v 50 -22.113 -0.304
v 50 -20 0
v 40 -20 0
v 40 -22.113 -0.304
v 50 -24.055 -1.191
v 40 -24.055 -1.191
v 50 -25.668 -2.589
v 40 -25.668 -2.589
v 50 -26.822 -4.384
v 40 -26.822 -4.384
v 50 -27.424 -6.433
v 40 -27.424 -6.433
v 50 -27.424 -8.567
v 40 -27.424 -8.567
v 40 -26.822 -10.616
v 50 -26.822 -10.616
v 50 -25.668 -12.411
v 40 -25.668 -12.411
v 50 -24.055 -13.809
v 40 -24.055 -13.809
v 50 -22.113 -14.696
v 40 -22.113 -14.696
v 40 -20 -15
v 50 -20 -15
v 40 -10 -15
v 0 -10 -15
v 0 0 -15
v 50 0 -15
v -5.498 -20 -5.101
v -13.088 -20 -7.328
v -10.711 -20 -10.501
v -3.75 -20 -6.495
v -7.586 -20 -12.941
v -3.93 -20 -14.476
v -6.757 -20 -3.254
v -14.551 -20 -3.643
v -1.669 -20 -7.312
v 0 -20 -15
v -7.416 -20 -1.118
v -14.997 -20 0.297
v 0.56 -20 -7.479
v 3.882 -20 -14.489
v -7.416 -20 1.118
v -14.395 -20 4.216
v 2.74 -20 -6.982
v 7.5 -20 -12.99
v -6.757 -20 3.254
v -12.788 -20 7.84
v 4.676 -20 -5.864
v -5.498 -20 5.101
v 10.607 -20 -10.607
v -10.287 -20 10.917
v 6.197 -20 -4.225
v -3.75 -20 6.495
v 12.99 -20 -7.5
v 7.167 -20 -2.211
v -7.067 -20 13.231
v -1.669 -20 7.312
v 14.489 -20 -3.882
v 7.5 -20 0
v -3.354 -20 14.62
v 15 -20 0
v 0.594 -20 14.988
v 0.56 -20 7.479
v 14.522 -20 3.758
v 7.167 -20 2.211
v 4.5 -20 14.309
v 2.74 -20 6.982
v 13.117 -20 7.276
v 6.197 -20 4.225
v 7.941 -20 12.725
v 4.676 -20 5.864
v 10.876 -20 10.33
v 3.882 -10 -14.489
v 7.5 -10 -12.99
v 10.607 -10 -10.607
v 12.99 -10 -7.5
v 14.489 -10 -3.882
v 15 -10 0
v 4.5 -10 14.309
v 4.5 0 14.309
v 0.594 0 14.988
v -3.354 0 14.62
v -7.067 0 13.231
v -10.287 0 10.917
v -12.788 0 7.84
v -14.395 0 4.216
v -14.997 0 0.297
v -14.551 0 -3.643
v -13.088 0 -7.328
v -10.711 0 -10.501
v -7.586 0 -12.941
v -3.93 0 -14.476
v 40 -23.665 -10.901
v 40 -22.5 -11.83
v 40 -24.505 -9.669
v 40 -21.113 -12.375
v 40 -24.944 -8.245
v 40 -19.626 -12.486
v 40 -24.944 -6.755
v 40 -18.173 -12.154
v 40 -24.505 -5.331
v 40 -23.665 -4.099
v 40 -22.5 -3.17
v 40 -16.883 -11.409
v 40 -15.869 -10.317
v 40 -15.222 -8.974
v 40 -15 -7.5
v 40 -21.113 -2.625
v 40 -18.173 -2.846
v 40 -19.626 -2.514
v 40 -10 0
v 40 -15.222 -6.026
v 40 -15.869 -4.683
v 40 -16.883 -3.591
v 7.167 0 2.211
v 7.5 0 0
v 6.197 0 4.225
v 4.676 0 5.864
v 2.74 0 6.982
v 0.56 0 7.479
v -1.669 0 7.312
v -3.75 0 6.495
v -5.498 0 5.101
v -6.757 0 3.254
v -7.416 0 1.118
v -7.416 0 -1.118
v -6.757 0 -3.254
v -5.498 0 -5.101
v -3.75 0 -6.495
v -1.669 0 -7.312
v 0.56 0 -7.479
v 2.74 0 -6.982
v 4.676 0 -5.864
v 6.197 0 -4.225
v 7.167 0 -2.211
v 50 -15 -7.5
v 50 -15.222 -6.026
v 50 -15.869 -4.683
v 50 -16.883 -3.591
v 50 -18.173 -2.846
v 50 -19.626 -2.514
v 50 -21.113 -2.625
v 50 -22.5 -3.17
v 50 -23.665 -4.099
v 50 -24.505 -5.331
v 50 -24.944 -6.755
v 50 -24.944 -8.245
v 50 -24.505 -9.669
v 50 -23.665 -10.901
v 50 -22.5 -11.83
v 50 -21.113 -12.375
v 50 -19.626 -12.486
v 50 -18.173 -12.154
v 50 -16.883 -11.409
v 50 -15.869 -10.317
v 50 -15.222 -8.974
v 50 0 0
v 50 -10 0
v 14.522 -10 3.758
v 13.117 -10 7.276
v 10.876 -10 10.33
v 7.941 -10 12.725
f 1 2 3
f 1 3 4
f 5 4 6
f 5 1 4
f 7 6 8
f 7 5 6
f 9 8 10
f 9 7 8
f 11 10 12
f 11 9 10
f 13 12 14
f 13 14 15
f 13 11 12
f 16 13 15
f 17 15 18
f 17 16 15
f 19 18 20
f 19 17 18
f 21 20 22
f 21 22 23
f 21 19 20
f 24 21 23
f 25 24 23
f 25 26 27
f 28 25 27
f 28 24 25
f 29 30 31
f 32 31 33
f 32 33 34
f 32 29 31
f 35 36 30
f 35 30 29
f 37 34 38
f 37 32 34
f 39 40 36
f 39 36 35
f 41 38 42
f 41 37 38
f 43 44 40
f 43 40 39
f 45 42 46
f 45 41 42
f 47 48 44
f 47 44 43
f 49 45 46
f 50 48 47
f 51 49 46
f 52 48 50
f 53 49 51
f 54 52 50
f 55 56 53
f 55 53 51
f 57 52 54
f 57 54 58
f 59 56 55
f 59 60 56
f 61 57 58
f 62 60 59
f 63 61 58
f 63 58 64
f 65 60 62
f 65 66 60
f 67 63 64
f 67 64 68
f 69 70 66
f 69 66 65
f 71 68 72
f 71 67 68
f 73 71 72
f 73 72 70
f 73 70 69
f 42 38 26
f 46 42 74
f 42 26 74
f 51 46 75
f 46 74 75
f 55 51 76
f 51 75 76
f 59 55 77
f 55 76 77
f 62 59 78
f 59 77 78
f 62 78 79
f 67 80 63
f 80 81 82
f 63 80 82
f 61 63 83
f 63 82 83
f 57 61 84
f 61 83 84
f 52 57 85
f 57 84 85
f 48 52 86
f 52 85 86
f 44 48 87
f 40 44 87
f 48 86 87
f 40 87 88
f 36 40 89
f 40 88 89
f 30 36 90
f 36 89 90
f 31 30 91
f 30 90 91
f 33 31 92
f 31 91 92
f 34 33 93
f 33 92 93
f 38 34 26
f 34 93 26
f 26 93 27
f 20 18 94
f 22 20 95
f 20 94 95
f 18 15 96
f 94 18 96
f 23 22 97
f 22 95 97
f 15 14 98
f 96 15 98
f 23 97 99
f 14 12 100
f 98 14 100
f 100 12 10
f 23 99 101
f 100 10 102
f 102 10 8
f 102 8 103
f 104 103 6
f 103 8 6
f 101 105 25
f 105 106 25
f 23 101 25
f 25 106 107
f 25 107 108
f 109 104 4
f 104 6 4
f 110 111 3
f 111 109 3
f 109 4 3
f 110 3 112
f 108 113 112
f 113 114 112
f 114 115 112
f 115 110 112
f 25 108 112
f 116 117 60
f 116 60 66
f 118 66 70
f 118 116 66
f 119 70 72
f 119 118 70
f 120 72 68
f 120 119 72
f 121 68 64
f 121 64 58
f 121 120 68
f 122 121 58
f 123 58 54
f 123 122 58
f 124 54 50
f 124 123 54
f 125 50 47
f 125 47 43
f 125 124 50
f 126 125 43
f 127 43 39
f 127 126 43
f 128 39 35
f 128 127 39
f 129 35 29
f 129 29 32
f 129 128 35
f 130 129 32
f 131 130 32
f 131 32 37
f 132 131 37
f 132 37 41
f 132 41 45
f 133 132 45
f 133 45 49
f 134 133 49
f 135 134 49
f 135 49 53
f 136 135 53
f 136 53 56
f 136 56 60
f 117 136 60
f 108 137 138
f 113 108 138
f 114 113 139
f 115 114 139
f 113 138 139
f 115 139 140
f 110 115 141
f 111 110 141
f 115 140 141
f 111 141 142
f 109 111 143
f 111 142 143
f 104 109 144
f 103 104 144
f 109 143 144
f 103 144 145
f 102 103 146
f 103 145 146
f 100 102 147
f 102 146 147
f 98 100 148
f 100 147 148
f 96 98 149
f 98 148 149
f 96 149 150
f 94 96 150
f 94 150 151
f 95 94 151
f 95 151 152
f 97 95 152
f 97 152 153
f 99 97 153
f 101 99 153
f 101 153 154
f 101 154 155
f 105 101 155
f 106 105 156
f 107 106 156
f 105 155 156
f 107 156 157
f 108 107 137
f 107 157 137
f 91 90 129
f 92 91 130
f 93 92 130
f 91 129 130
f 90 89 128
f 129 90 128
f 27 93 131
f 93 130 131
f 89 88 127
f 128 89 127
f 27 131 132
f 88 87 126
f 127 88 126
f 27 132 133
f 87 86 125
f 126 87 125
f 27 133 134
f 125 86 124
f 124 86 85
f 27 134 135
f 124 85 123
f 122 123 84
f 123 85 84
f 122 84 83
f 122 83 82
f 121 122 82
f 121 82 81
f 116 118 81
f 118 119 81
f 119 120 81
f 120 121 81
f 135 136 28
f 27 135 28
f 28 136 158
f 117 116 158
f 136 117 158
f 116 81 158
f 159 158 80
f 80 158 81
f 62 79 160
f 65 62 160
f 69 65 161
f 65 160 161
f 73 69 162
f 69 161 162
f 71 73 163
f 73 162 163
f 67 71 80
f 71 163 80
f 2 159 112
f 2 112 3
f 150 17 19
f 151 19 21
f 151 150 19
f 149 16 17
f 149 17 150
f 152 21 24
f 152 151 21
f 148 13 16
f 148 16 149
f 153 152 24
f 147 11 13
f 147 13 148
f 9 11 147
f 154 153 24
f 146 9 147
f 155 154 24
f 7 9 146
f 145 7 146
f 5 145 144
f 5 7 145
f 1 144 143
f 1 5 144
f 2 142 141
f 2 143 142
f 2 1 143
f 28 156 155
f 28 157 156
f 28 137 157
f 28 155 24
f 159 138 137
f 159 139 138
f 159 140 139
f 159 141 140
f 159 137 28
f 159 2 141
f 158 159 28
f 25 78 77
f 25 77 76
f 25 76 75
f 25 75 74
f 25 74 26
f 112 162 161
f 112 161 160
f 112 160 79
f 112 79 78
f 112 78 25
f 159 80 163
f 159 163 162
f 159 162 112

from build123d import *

# Parameters (mm, degrees)
F0_R     = 7.5
F1_DEPTH = 10
F2_DEPTH = 20
F3_R     = 5
F4_DEPTH = 10


with BuildPart() as f1:
    # F0 (on Front) → F1 (new body)
    with BuildSketch(Plane.XZ):
        with BuildLine():
            ThreePointArc((0, -15), (10.606602, -10.606602), (15, 0))
            ThreePointArc((15, 0), (12.093387, 8.87412), (4.5, 14.309088))
            ThreePointArc((4.5, 14.309088), (-14.826266, 2.276365), (0, -15))
        make_face()
        Circle(F0_R, mode=Mode.SUBTRACT)
        with BuildLine():
            ThreePointArc((4.5, 14.309088), (12.093387, 8.87412), (15, 0))
            ThreePointArc((15, 0), (10.606602, -10.606602), (0, -15))
            Line((0, -15), (50, -15))
            Line((50, -15), (50, 0))
            Line((50, 0), (4.5, 14.309088))
        make_face()
    extrude(amount=F1_DEPTH)

    # F0 (on Front) → F2 (join)
    with BuildSketch(Plane.XZ):
        with BuildLine():
            ThreePointArc((0, -15), (10.606602, -10.606602), (15, 0))
            ThreePointArc((15, 0), (12.093387, 8.87412), (4.5, 14.309088))
            ThreePointArc((4.5, 14.309088), (-14.826266, 2.276365), (0, -15))
        make_face()
        Circle(F0_R, mode=Mode.SUBTRACT)
    extrude(amount=F2_DEPTH)

    # F3 (on face) → F4 (join)
    with BuildSketch(Plane.YZ.offset(50)):
        with BuildLine():
            Line((-20, -15), (0, -15))
            Line((0, -15), (0, 0))
            Line((0, 0), (-20, 0))
            ThreePointArc((-20, 0), (-27.5, -7.5), (-20, -15))
        make_face()
        with Locations((-20, -7.5)):
            Circle(F3_R, mode=Mode.SUBTRACT)
    extrude(amount=-F4_DEPTH)


solid = f1.part
